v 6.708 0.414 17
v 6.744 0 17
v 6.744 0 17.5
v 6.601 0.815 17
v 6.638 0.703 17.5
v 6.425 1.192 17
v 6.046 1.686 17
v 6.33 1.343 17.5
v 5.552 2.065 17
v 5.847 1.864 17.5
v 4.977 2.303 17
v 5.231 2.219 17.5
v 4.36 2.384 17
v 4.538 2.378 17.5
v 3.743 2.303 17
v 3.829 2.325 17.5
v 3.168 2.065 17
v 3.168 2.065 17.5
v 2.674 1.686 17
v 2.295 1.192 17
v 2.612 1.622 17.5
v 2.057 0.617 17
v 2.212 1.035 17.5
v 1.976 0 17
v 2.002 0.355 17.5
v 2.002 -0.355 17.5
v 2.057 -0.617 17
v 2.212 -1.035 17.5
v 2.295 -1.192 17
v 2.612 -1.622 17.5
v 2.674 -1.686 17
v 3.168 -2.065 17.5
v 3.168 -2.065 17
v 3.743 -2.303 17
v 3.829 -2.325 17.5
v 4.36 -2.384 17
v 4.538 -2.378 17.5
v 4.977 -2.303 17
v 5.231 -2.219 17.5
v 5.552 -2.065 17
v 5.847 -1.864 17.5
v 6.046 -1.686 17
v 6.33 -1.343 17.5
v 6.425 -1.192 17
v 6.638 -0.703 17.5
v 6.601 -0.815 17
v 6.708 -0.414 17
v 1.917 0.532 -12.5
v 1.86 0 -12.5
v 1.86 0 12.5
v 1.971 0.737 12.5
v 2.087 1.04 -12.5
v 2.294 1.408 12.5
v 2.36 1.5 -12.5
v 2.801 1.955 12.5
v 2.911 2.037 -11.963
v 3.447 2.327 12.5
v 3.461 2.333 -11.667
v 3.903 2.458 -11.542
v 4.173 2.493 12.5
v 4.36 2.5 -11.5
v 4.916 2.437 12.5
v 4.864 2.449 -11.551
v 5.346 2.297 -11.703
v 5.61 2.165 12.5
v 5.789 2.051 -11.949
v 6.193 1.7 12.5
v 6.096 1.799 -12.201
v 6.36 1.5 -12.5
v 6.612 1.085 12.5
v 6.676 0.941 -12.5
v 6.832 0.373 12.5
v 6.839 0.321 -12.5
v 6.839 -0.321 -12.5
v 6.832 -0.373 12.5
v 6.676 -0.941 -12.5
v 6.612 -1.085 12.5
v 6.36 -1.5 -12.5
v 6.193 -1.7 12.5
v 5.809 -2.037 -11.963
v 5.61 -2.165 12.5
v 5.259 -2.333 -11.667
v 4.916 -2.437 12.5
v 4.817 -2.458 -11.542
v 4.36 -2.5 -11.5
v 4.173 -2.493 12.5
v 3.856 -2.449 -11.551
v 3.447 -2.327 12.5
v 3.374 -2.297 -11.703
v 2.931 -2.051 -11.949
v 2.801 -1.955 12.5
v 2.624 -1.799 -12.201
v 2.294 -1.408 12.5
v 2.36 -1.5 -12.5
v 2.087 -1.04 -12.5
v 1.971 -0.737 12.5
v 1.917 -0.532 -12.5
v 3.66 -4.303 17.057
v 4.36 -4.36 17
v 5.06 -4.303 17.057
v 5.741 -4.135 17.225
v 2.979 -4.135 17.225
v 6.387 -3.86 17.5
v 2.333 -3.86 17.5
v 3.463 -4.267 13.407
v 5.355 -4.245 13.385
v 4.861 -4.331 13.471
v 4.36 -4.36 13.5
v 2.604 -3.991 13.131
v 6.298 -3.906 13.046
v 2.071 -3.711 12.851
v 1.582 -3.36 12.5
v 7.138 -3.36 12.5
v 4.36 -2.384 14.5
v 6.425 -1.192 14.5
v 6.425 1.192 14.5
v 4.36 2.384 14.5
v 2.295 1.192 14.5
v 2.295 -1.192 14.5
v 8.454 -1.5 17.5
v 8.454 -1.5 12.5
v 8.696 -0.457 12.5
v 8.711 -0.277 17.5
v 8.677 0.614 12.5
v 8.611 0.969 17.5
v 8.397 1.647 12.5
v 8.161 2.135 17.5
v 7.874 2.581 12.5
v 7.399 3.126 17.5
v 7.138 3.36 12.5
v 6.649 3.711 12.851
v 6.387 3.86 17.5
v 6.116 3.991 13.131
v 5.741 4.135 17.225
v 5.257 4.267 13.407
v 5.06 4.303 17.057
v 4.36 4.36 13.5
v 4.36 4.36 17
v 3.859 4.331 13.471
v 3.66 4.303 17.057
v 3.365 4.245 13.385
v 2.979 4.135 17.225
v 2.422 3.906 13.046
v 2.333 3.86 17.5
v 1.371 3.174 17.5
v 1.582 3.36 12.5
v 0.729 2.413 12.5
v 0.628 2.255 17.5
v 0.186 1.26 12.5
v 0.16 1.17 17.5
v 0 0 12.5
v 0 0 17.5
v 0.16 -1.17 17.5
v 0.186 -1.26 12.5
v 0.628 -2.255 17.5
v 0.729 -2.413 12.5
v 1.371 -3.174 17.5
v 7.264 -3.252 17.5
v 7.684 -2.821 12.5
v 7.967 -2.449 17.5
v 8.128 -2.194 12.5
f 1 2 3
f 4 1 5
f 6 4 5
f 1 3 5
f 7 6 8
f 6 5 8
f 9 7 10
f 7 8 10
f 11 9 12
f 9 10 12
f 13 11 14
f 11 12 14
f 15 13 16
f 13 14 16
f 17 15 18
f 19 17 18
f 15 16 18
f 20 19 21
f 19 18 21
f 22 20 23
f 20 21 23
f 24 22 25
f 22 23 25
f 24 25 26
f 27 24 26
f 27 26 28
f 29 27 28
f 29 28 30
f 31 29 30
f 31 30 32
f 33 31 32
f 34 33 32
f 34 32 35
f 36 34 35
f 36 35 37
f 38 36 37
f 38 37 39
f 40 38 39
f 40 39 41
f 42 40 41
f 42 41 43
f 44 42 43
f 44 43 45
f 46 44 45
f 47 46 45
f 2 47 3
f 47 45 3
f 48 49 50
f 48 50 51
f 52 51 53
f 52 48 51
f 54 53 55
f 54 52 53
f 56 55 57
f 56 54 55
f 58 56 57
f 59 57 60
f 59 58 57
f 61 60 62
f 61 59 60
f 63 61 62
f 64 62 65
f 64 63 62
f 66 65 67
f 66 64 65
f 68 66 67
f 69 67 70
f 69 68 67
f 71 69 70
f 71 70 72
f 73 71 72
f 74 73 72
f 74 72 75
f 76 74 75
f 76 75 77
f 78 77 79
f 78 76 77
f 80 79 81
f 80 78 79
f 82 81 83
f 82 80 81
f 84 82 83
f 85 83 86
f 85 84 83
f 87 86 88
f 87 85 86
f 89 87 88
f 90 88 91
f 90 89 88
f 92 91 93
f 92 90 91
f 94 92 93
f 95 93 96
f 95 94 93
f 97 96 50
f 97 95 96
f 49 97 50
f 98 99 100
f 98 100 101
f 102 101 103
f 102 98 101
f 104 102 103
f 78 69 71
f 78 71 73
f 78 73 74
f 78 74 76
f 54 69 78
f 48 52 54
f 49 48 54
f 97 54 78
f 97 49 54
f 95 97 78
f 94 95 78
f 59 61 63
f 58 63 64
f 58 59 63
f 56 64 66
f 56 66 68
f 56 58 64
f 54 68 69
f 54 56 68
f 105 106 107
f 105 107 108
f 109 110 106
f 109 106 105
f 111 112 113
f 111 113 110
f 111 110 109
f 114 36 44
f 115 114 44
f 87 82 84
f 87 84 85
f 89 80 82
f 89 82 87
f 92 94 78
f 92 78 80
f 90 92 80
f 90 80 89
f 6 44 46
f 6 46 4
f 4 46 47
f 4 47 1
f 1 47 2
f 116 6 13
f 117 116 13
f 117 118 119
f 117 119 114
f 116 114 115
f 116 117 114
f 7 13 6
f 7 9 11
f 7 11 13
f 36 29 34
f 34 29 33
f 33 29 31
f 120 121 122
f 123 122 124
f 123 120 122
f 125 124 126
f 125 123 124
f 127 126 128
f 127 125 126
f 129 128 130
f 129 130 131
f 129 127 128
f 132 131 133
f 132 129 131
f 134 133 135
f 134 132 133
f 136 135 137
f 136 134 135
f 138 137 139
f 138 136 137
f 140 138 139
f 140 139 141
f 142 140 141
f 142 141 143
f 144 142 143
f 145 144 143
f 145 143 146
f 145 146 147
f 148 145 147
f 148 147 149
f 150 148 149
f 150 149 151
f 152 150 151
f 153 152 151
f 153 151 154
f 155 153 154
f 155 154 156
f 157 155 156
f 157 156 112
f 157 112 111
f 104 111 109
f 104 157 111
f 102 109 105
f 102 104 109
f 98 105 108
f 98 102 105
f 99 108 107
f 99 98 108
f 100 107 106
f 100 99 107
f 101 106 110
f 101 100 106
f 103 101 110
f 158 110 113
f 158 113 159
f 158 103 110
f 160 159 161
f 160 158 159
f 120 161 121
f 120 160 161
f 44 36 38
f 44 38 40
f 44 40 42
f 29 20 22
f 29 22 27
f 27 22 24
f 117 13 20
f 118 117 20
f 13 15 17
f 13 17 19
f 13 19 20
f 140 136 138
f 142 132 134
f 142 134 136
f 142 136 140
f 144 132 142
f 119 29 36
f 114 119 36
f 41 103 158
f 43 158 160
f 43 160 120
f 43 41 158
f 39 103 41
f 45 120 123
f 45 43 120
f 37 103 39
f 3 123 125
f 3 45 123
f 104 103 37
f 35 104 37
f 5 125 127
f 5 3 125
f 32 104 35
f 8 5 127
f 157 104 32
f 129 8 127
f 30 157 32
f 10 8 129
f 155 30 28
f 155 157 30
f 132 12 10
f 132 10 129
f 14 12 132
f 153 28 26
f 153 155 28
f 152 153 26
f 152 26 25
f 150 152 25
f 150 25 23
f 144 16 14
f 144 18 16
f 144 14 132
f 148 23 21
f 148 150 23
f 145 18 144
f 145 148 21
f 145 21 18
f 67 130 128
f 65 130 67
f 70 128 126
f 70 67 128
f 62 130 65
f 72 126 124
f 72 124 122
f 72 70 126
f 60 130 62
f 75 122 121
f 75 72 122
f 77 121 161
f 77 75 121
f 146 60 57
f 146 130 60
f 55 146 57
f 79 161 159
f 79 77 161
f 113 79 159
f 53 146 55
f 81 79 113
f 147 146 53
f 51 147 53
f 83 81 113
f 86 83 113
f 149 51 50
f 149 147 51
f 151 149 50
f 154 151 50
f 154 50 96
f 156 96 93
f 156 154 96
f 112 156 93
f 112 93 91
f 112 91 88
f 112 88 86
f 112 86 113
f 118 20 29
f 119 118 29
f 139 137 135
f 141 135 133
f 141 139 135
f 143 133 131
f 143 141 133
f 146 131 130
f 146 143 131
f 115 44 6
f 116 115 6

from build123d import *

# Parameters (mm, degrees)
BOSS_EXTRUDE1_DEPTH = 10
SKETCH2_OUTSIDE_W   = 18.56
SKETCH2_OUTSIDE_H   = 17.28
SKETCH2_OUTSIDE_R   = 4.36
CUT_EXTRUDE4_DEPTH  = 32.921929766
SKETCH3_R           = 2.384318612
CUT_EXTRUDE7_DEPTH  = 0.5
CUT_EXTRUDE8_DEPTH  = 2.5
SKETCH5_OUTSIDE_W   = 17.208
SKETCH5_OUTSIDE_H   = 17.208
SKETCH5_OUTSIDE_R   = 2.5
CUT_EXTRUDE9_DEPTH  = 25


with BuildPart() as part:
    # Sketch1 → Boss-Extrude1 (new body)
    with BuildSketch(Plane(origin=(0, 0, 0), x_dir=(0, 0, -1), z_dir=(1, 0, 0))):
        Polygon((11.5, -2.5), (-12.5, -2.5), (-12.5, -3.36), (-13.5, -4.36), (-17, -4.36), (-17.5, -3.86), (-17.5, 3.86), (-17, 4.36), (-13.5, 4.36), (-12.5, 3.36), (-12.5, 2.5), (11.5, 2.5), (12.5, 1.5), (12.5, -1.5), align=None)
    extrude(amount=BOSS_EXTRUDE1_DEPTH)

    # Sketch2 outside → Cut-Extrude4 (cut, through all)
    with BuildSketch(Plane.XY.offset(17.5)):
        with Locations((5, 0)):
            Rectangle(SKETCH2_OUTSIDE_W, SKETCH2_OUTSIDE_H)
        with Locations(Location((4.36, 0, 0), (0, 0, 339.876996719))):
            Circle(SKETCH2_OUTSIDE_R, mode=Mode.SUBTRACT)
    extrude(amount=-CUT_EXTRUDE4_DEPTH, mode=Mode.SUBTRACT)

    # Sketch3 → Cut-Extrude7 (cut)
    with BuildSketch(Plane.XY.offset(17.5)):
        with Locations((4.36, 0)):
            Circle(SKETCH3_R)
    extrude(amount=-CUT_EXTRUDE7_DEPTH, mode=Mode.SUBTRACT)

    # Sketch4 → Cut-Extrude8 (cut)
    with BuildSketch(Plane.XY.offset(17)):
        Polygon((4.36, 2.384318612), (2.295119511, 1.192159306), (2.295119511, -1.192159306), (4.36, -2.384318612), (6.424880489, -1.192159306), (6.424880489, 1.192159306), align=None)
    extrude(amount=-CUT_EXTRUDE8_DEPTH, mode=Mode.SUBTRACT)

    # Sketch5 outside → Cut-Extrude9 (cut)
    with BuildSketch(Plane(origin=(0, 0, -12.5), x_dir=(-1, 0, 0), z_dir=(0, 0, -1))):
        with Locations((-4.36, 0)):
            Rectangle(SKETCH5_OUTSIDE_W, SKETCH5_OUTSIDE_H)
        with Locations((-4.36, 0)):
            Circle(SKETCH5_OUTSIDE_R, mode=Mode.SUBTRACT)
    extrude(amount=-CUT_EXTRUDE9_DEPTH, mode=Mode.SUBTRACT)


solid = part.part
